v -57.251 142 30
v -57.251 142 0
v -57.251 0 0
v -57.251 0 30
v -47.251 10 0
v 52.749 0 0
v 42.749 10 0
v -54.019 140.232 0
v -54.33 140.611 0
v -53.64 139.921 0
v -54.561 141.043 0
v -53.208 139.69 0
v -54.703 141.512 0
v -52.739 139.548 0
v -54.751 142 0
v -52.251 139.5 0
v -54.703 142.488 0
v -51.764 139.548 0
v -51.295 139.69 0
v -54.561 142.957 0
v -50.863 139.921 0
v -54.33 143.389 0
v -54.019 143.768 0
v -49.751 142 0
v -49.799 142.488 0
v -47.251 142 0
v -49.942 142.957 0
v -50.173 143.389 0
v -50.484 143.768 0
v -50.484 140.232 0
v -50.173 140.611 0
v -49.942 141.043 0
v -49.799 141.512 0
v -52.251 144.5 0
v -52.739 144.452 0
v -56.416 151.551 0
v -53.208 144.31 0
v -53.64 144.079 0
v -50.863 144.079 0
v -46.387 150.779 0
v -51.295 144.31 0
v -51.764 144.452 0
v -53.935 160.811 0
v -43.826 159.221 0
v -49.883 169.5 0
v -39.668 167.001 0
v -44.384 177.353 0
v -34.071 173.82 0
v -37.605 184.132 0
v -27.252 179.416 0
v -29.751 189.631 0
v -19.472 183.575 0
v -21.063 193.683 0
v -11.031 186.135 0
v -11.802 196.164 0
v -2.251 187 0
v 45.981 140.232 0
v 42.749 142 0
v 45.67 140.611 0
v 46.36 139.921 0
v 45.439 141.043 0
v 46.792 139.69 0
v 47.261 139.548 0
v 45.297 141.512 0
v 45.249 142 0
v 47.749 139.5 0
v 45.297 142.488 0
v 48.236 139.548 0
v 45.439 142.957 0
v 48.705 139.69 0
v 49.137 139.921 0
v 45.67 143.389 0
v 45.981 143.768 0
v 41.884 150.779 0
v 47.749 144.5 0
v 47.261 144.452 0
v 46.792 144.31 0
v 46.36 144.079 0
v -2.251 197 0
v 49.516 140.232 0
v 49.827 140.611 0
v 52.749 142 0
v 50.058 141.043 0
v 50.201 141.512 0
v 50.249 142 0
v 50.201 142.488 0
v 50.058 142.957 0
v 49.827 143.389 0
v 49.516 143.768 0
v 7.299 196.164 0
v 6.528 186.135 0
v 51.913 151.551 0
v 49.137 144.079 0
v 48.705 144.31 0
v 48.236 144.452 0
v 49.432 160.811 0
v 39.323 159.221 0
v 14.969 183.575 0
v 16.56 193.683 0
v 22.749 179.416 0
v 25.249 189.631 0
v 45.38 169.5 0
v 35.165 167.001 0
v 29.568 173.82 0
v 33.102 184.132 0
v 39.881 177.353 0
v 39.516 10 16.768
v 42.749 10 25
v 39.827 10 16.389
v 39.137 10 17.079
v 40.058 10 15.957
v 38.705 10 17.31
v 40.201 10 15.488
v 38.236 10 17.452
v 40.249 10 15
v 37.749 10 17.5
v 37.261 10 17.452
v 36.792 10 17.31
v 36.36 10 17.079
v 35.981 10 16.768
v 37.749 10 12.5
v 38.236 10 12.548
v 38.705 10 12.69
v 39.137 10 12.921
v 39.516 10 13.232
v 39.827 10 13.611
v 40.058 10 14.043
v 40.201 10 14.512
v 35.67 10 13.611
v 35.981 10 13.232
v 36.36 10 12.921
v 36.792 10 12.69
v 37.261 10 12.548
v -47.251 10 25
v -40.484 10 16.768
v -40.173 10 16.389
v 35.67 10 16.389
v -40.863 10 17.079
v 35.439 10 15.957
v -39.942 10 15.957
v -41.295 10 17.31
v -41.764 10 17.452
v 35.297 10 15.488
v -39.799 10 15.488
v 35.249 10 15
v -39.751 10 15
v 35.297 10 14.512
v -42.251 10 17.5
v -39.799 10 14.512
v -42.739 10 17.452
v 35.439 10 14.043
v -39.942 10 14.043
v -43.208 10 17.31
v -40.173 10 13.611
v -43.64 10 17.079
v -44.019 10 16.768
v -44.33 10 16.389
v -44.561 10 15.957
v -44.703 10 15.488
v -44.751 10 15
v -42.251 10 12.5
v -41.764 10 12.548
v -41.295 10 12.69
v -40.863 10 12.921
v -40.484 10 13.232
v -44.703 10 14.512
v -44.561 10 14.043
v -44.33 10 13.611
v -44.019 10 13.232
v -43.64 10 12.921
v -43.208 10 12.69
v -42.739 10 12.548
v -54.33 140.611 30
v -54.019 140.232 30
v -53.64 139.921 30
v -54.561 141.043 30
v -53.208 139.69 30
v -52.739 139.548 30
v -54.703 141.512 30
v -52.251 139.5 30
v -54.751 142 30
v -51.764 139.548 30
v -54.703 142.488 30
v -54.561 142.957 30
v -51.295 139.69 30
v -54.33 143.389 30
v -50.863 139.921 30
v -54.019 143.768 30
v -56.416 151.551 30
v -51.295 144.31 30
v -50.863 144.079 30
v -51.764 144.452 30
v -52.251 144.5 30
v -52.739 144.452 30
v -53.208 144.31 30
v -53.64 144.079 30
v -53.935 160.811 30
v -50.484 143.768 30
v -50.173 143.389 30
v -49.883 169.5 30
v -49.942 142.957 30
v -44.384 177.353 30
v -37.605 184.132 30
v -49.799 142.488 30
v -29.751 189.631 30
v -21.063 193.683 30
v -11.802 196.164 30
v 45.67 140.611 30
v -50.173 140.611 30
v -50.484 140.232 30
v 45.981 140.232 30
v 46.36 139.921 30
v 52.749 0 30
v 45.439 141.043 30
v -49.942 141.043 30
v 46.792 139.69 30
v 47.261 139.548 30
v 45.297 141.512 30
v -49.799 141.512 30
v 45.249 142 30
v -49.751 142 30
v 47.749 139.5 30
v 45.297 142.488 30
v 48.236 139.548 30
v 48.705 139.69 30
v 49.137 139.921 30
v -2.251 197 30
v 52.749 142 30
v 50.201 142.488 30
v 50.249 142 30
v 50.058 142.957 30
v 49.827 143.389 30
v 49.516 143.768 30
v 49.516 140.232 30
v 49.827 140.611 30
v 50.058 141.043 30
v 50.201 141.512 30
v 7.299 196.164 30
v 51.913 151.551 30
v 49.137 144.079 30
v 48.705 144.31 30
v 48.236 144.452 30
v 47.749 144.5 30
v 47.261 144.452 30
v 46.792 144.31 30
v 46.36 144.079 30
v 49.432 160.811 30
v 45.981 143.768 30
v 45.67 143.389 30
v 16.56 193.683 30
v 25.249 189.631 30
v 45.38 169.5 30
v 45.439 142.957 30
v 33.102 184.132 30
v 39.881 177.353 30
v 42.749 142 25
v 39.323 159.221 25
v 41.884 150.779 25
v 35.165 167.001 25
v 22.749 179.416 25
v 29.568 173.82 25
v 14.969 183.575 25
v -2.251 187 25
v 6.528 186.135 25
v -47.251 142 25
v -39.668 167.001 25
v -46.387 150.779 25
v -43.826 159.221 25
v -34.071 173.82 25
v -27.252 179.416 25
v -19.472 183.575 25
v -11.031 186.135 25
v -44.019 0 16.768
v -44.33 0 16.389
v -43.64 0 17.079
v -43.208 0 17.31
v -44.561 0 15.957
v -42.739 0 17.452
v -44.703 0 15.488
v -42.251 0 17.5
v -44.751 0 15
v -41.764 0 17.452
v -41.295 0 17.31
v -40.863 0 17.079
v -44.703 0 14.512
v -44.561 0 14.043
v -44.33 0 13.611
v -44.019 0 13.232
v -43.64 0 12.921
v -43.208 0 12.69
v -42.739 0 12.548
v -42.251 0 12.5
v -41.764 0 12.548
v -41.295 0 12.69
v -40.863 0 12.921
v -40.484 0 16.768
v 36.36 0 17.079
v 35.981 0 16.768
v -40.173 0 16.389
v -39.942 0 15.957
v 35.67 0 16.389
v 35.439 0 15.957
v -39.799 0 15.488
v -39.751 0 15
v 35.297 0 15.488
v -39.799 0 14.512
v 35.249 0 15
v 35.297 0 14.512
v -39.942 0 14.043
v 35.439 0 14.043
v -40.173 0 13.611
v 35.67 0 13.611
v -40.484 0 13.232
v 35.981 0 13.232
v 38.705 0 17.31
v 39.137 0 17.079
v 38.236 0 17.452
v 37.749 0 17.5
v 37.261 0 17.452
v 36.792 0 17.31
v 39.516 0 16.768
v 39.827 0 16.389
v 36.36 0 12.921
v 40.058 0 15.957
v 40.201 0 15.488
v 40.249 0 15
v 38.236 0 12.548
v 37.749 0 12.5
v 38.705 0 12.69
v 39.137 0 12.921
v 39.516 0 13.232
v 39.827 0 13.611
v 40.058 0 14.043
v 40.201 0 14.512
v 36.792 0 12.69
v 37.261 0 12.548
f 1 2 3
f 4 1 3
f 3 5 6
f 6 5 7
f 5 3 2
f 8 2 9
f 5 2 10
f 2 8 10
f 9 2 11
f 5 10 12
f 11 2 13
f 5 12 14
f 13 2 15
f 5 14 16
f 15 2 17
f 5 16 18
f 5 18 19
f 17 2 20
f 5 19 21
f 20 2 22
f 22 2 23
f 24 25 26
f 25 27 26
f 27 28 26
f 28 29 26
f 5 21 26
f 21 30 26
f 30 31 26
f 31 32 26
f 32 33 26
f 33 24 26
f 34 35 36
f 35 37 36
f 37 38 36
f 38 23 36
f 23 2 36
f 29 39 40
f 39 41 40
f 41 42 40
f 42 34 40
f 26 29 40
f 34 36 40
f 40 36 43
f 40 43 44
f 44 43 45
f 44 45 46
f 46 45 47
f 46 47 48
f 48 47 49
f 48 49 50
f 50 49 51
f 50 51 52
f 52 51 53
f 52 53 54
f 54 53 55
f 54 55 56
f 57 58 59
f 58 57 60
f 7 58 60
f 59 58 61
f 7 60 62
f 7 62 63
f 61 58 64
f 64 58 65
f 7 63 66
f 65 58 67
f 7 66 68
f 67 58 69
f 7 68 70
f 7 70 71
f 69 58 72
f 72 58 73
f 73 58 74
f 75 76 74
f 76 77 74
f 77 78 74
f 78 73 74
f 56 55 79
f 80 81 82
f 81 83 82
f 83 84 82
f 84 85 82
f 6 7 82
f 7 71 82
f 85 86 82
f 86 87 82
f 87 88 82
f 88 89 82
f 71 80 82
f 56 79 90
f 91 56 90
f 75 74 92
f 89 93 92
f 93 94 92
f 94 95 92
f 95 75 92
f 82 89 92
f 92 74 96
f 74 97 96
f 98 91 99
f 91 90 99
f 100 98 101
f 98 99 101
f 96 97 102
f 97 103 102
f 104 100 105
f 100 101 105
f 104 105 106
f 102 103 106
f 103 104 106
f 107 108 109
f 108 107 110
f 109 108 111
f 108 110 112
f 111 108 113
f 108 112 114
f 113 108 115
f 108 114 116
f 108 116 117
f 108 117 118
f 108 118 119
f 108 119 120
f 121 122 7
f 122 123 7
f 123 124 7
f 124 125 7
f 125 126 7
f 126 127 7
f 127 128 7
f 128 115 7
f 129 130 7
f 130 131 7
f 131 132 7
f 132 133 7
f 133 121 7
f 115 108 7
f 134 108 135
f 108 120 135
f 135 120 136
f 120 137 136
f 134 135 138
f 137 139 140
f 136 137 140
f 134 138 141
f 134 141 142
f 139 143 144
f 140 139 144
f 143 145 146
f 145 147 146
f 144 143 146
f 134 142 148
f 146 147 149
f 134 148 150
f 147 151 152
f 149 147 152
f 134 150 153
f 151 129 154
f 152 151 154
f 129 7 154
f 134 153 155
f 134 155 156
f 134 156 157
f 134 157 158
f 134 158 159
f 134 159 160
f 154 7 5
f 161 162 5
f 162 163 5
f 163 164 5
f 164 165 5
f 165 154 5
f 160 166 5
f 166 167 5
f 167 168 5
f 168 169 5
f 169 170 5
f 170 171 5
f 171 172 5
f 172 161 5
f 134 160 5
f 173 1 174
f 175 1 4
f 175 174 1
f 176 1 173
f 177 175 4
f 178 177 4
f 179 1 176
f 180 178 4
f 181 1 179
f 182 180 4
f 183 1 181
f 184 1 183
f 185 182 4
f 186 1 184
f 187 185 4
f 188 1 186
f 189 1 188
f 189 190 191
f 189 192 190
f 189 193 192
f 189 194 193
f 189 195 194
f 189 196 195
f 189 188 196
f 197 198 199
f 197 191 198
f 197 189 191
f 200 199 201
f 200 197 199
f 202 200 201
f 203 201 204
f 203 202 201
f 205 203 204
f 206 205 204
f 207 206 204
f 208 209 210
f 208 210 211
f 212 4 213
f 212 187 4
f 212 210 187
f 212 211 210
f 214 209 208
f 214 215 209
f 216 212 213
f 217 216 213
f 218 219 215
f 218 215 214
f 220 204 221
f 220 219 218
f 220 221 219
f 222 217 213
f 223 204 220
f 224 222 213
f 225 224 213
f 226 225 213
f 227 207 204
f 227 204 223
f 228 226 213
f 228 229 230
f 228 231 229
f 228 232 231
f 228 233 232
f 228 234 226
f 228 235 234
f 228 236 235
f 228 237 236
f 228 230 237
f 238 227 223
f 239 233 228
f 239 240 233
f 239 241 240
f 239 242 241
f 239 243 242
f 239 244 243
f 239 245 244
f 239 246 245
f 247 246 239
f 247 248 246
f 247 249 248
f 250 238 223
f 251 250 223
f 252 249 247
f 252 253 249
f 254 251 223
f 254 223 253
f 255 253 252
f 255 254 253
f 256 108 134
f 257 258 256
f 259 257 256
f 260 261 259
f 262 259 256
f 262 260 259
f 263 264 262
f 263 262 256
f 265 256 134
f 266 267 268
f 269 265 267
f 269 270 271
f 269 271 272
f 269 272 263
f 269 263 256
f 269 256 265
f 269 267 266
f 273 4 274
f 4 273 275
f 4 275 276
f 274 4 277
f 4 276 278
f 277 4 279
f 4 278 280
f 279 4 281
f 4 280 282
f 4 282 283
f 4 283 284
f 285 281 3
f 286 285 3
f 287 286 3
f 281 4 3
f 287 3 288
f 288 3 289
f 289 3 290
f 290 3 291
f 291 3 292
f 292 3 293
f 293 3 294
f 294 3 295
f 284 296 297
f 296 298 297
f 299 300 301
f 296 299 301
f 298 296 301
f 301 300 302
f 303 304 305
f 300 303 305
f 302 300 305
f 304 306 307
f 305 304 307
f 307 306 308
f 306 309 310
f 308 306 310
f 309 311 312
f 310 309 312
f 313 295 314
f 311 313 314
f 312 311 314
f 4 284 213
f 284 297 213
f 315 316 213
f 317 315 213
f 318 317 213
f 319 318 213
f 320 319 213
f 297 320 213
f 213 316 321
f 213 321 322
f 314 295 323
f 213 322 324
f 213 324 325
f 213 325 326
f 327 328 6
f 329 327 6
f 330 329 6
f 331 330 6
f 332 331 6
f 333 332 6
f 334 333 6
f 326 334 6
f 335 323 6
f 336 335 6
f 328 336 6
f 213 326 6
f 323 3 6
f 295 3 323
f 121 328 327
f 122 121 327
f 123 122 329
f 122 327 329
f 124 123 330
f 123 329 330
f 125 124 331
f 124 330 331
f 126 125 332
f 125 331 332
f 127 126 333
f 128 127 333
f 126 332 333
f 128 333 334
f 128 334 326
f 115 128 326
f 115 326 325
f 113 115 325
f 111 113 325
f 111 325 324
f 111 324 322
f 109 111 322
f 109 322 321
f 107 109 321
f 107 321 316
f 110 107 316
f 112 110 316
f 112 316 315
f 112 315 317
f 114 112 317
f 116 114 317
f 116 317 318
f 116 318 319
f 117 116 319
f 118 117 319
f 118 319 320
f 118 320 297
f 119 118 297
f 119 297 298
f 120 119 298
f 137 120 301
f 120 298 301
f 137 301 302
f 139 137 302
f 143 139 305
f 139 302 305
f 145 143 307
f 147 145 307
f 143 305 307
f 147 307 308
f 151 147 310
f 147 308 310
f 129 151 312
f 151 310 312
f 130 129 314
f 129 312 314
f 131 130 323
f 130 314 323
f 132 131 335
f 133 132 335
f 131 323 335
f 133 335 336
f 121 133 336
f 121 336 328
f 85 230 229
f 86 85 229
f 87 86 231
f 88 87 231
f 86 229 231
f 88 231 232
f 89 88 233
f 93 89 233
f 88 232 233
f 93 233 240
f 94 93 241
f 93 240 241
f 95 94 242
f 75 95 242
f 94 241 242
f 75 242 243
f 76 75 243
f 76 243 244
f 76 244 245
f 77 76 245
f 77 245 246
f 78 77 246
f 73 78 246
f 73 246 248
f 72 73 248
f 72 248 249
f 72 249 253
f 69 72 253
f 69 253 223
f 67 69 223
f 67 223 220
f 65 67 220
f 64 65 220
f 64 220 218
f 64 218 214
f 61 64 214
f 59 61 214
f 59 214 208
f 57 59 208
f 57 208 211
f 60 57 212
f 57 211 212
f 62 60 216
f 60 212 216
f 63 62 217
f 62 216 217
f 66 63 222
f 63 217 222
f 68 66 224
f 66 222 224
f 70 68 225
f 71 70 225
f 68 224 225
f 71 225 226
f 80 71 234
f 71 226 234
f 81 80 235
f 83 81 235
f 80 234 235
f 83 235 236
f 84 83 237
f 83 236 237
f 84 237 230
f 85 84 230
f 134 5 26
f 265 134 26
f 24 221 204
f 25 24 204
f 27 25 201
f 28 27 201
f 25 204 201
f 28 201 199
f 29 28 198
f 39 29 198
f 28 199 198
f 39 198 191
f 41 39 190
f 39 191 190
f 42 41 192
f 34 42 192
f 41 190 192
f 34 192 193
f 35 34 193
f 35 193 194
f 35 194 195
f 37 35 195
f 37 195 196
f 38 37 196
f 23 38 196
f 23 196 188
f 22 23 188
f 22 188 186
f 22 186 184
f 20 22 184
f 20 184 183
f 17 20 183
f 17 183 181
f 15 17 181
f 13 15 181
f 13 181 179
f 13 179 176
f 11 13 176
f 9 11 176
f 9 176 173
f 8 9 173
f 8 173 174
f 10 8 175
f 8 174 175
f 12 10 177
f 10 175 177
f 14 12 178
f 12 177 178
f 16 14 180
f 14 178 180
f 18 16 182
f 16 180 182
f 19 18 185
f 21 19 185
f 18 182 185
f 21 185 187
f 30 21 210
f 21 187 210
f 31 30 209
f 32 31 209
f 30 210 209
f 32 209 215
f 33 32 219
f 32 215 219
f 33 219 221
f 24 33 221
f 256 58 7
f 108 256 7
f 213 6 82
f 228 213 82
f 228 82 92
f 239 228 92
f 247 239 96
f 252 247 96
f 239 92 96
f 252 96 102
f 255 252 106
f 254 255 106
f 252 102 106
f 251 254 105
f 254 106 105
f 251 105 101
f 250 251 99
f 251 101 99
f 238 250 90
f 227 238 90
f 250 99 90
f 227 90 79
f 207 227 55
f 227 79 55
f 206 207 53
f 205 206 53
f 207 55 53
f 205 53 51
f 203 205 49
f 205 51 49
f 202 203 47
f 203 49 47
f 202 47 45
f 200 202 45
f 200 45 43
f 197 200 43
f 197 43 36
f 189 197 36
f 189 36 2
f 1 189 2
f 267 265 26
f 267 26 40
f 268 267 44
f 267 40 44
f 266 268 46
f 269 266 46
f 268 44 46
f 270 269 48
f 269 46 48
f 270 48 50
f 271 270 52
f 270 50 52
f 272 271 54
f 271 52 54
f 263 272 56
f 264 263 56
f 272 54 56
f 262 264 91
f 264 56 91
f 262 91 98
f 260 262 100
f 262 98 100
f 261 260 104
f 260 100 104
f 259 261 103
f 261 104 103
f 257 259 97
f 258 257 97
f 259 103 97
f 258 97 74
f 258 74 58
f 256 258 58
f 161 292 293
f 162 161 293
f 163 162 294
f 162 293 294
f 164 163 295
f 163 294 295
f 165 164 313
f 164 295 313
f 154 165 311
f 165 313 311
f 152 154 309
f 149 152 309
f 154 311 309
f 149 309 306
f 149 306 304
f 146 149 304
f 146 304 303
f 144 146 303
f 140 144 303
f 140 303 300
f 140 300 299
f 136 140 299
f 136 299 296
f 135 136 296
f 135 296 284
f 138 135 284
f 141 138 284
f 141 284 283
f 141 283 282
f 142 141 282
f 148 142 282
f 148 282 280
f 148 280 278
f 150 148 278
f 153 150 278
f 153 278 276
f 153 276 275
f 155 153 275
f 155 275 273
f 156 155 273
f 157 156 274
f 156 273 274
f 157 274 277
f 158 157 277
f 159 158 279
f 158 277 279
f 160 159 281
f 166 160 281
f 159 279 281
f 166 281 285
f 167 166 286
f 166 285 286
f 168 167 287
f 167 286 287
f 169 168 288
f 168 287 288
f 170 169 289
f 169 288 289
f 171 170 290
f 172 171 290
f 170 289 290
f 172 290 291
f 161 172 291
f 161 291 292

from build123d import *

# Parameters (mm, degrees)
BOSS_EXTRUDE1_DEPTH        = 30
CUT_EXTRUDE1_DEPTH         = 25
F_5_0MM_DOWEL_HOLE2_REACH  = 221.224
F_5_0MM_DOWEL_HOLE2_BORE_R = 2.5
F_5_0MM_DOWEL_HOLE4_D      = 5


with BuildPart() as part:
    # Sketch1 → Boss-Extrude1 (new body)
    with BuildSketch(Plane.XY):
        with BuildLine():
            Line((-57.251461988, 0), (52.748538012, 0))
            Line((52.748538012, 0), (52.748538012, 142))
            ThreePointArc((52.748538012, 142), (-2.251461988, 197), (-57.251461988, 142))
            Line((-57.251461988, 142), (-57.251461988, 0))
        make_face()
    extrude(amount=BOSS_EXTRUDE1_DEPTH)

    # Sketch8 → Cut-Extrude1 (cut)
    with BuildSketch(Plane(origin=(0, 0, 0), x_dir=(-1, 0, 0), z_dir=(0, 0, -1))):
        with BuildLine():
            Line((-42.748538012, 10), (47.251461988, 10))
            Line((47.251461988, 10), (47.251461988, 142))
            ThreePointArc((47.251461988, 142), (2.251461988, 187), (-42.748538012, 142))
            Line((-42.748538012, 142), (-42.748538012, 10))
        make_face()
    extrude(amount=-CUT_EXTRUDE1_DEPTH, mode=Mode.SUBTRACT)

    # Ø5.0mm Dowel Hole2 bore (on position points) → Ø5.0mm Dowel Hole2 (cut, up to next)
    with BuildSketch(Plane(origin=(-42.251461988, 0, 15), x_dir=(0, 0, -1), z_dir=(0, -1, 0)), mode=Mode.PRIVATE) as f_5_0mm_dowel_hole2_sk1:
        Circle(F_5_0MM_DOWEL_HOLE2_BORE_R)
    f_5_0mm_dowel_hole2_tool1 = extrude(f_5_0mm_dowel_hole2_sk1.sketch, amount=-F_5_0MM_DOWEL_HOLE2_REACH, mode=Mode.PRIVATE) & part.part
    # Ø5.0mm Dowel Hole2 bore (on position points) → Ø5.0mm Dowel Hole2 (cut, up to next)
    with BuildSketch(Plane(origin=(-42.251461988, 0, 15), x_dir=(0, 0, -1), z_dir=(0, -1, 0)), mode=Mode.PRIVATE) as f_5_0mm_dowel_hole2_sk2:
        with Locations((0, 80)):
            Circle(F_5_0MM_DOWEL_HOLE2_BORE_R)
    f_5_0mm_dowel_hole2_tool2 = extrude(f_5_0mm_dowel_hole2_sk2.sketch, amount=-F_5_0MM_DOWEL_HOLE2_REACH, mode=Mode.PRIVATE) & part.part
    add(f_5_0mm_dowel_hole2_tool1.solids().sort_by_distance((-42.251462, 0, 15))[0], mode=Mode.SUBTRACT)
    add(f_5_0mm_dowel_hole2_tool2.solids().sort_by_distance((37.748538, 0, 15))[0], mode=Mode.SUBTRACT)

    # Ø5.0mm Dowel Hole4 (through all)
    with Locations(Plane(origin=(47.748538012, 142, 0), x_dir=(-1, 0, 0), z_dir=(0, 0, -1))):
        with Locations((0, 0), (100, 0)):
            Hole(F_5_0MM_DOWEL_HOLE4_D / 2)


solid = part.part
